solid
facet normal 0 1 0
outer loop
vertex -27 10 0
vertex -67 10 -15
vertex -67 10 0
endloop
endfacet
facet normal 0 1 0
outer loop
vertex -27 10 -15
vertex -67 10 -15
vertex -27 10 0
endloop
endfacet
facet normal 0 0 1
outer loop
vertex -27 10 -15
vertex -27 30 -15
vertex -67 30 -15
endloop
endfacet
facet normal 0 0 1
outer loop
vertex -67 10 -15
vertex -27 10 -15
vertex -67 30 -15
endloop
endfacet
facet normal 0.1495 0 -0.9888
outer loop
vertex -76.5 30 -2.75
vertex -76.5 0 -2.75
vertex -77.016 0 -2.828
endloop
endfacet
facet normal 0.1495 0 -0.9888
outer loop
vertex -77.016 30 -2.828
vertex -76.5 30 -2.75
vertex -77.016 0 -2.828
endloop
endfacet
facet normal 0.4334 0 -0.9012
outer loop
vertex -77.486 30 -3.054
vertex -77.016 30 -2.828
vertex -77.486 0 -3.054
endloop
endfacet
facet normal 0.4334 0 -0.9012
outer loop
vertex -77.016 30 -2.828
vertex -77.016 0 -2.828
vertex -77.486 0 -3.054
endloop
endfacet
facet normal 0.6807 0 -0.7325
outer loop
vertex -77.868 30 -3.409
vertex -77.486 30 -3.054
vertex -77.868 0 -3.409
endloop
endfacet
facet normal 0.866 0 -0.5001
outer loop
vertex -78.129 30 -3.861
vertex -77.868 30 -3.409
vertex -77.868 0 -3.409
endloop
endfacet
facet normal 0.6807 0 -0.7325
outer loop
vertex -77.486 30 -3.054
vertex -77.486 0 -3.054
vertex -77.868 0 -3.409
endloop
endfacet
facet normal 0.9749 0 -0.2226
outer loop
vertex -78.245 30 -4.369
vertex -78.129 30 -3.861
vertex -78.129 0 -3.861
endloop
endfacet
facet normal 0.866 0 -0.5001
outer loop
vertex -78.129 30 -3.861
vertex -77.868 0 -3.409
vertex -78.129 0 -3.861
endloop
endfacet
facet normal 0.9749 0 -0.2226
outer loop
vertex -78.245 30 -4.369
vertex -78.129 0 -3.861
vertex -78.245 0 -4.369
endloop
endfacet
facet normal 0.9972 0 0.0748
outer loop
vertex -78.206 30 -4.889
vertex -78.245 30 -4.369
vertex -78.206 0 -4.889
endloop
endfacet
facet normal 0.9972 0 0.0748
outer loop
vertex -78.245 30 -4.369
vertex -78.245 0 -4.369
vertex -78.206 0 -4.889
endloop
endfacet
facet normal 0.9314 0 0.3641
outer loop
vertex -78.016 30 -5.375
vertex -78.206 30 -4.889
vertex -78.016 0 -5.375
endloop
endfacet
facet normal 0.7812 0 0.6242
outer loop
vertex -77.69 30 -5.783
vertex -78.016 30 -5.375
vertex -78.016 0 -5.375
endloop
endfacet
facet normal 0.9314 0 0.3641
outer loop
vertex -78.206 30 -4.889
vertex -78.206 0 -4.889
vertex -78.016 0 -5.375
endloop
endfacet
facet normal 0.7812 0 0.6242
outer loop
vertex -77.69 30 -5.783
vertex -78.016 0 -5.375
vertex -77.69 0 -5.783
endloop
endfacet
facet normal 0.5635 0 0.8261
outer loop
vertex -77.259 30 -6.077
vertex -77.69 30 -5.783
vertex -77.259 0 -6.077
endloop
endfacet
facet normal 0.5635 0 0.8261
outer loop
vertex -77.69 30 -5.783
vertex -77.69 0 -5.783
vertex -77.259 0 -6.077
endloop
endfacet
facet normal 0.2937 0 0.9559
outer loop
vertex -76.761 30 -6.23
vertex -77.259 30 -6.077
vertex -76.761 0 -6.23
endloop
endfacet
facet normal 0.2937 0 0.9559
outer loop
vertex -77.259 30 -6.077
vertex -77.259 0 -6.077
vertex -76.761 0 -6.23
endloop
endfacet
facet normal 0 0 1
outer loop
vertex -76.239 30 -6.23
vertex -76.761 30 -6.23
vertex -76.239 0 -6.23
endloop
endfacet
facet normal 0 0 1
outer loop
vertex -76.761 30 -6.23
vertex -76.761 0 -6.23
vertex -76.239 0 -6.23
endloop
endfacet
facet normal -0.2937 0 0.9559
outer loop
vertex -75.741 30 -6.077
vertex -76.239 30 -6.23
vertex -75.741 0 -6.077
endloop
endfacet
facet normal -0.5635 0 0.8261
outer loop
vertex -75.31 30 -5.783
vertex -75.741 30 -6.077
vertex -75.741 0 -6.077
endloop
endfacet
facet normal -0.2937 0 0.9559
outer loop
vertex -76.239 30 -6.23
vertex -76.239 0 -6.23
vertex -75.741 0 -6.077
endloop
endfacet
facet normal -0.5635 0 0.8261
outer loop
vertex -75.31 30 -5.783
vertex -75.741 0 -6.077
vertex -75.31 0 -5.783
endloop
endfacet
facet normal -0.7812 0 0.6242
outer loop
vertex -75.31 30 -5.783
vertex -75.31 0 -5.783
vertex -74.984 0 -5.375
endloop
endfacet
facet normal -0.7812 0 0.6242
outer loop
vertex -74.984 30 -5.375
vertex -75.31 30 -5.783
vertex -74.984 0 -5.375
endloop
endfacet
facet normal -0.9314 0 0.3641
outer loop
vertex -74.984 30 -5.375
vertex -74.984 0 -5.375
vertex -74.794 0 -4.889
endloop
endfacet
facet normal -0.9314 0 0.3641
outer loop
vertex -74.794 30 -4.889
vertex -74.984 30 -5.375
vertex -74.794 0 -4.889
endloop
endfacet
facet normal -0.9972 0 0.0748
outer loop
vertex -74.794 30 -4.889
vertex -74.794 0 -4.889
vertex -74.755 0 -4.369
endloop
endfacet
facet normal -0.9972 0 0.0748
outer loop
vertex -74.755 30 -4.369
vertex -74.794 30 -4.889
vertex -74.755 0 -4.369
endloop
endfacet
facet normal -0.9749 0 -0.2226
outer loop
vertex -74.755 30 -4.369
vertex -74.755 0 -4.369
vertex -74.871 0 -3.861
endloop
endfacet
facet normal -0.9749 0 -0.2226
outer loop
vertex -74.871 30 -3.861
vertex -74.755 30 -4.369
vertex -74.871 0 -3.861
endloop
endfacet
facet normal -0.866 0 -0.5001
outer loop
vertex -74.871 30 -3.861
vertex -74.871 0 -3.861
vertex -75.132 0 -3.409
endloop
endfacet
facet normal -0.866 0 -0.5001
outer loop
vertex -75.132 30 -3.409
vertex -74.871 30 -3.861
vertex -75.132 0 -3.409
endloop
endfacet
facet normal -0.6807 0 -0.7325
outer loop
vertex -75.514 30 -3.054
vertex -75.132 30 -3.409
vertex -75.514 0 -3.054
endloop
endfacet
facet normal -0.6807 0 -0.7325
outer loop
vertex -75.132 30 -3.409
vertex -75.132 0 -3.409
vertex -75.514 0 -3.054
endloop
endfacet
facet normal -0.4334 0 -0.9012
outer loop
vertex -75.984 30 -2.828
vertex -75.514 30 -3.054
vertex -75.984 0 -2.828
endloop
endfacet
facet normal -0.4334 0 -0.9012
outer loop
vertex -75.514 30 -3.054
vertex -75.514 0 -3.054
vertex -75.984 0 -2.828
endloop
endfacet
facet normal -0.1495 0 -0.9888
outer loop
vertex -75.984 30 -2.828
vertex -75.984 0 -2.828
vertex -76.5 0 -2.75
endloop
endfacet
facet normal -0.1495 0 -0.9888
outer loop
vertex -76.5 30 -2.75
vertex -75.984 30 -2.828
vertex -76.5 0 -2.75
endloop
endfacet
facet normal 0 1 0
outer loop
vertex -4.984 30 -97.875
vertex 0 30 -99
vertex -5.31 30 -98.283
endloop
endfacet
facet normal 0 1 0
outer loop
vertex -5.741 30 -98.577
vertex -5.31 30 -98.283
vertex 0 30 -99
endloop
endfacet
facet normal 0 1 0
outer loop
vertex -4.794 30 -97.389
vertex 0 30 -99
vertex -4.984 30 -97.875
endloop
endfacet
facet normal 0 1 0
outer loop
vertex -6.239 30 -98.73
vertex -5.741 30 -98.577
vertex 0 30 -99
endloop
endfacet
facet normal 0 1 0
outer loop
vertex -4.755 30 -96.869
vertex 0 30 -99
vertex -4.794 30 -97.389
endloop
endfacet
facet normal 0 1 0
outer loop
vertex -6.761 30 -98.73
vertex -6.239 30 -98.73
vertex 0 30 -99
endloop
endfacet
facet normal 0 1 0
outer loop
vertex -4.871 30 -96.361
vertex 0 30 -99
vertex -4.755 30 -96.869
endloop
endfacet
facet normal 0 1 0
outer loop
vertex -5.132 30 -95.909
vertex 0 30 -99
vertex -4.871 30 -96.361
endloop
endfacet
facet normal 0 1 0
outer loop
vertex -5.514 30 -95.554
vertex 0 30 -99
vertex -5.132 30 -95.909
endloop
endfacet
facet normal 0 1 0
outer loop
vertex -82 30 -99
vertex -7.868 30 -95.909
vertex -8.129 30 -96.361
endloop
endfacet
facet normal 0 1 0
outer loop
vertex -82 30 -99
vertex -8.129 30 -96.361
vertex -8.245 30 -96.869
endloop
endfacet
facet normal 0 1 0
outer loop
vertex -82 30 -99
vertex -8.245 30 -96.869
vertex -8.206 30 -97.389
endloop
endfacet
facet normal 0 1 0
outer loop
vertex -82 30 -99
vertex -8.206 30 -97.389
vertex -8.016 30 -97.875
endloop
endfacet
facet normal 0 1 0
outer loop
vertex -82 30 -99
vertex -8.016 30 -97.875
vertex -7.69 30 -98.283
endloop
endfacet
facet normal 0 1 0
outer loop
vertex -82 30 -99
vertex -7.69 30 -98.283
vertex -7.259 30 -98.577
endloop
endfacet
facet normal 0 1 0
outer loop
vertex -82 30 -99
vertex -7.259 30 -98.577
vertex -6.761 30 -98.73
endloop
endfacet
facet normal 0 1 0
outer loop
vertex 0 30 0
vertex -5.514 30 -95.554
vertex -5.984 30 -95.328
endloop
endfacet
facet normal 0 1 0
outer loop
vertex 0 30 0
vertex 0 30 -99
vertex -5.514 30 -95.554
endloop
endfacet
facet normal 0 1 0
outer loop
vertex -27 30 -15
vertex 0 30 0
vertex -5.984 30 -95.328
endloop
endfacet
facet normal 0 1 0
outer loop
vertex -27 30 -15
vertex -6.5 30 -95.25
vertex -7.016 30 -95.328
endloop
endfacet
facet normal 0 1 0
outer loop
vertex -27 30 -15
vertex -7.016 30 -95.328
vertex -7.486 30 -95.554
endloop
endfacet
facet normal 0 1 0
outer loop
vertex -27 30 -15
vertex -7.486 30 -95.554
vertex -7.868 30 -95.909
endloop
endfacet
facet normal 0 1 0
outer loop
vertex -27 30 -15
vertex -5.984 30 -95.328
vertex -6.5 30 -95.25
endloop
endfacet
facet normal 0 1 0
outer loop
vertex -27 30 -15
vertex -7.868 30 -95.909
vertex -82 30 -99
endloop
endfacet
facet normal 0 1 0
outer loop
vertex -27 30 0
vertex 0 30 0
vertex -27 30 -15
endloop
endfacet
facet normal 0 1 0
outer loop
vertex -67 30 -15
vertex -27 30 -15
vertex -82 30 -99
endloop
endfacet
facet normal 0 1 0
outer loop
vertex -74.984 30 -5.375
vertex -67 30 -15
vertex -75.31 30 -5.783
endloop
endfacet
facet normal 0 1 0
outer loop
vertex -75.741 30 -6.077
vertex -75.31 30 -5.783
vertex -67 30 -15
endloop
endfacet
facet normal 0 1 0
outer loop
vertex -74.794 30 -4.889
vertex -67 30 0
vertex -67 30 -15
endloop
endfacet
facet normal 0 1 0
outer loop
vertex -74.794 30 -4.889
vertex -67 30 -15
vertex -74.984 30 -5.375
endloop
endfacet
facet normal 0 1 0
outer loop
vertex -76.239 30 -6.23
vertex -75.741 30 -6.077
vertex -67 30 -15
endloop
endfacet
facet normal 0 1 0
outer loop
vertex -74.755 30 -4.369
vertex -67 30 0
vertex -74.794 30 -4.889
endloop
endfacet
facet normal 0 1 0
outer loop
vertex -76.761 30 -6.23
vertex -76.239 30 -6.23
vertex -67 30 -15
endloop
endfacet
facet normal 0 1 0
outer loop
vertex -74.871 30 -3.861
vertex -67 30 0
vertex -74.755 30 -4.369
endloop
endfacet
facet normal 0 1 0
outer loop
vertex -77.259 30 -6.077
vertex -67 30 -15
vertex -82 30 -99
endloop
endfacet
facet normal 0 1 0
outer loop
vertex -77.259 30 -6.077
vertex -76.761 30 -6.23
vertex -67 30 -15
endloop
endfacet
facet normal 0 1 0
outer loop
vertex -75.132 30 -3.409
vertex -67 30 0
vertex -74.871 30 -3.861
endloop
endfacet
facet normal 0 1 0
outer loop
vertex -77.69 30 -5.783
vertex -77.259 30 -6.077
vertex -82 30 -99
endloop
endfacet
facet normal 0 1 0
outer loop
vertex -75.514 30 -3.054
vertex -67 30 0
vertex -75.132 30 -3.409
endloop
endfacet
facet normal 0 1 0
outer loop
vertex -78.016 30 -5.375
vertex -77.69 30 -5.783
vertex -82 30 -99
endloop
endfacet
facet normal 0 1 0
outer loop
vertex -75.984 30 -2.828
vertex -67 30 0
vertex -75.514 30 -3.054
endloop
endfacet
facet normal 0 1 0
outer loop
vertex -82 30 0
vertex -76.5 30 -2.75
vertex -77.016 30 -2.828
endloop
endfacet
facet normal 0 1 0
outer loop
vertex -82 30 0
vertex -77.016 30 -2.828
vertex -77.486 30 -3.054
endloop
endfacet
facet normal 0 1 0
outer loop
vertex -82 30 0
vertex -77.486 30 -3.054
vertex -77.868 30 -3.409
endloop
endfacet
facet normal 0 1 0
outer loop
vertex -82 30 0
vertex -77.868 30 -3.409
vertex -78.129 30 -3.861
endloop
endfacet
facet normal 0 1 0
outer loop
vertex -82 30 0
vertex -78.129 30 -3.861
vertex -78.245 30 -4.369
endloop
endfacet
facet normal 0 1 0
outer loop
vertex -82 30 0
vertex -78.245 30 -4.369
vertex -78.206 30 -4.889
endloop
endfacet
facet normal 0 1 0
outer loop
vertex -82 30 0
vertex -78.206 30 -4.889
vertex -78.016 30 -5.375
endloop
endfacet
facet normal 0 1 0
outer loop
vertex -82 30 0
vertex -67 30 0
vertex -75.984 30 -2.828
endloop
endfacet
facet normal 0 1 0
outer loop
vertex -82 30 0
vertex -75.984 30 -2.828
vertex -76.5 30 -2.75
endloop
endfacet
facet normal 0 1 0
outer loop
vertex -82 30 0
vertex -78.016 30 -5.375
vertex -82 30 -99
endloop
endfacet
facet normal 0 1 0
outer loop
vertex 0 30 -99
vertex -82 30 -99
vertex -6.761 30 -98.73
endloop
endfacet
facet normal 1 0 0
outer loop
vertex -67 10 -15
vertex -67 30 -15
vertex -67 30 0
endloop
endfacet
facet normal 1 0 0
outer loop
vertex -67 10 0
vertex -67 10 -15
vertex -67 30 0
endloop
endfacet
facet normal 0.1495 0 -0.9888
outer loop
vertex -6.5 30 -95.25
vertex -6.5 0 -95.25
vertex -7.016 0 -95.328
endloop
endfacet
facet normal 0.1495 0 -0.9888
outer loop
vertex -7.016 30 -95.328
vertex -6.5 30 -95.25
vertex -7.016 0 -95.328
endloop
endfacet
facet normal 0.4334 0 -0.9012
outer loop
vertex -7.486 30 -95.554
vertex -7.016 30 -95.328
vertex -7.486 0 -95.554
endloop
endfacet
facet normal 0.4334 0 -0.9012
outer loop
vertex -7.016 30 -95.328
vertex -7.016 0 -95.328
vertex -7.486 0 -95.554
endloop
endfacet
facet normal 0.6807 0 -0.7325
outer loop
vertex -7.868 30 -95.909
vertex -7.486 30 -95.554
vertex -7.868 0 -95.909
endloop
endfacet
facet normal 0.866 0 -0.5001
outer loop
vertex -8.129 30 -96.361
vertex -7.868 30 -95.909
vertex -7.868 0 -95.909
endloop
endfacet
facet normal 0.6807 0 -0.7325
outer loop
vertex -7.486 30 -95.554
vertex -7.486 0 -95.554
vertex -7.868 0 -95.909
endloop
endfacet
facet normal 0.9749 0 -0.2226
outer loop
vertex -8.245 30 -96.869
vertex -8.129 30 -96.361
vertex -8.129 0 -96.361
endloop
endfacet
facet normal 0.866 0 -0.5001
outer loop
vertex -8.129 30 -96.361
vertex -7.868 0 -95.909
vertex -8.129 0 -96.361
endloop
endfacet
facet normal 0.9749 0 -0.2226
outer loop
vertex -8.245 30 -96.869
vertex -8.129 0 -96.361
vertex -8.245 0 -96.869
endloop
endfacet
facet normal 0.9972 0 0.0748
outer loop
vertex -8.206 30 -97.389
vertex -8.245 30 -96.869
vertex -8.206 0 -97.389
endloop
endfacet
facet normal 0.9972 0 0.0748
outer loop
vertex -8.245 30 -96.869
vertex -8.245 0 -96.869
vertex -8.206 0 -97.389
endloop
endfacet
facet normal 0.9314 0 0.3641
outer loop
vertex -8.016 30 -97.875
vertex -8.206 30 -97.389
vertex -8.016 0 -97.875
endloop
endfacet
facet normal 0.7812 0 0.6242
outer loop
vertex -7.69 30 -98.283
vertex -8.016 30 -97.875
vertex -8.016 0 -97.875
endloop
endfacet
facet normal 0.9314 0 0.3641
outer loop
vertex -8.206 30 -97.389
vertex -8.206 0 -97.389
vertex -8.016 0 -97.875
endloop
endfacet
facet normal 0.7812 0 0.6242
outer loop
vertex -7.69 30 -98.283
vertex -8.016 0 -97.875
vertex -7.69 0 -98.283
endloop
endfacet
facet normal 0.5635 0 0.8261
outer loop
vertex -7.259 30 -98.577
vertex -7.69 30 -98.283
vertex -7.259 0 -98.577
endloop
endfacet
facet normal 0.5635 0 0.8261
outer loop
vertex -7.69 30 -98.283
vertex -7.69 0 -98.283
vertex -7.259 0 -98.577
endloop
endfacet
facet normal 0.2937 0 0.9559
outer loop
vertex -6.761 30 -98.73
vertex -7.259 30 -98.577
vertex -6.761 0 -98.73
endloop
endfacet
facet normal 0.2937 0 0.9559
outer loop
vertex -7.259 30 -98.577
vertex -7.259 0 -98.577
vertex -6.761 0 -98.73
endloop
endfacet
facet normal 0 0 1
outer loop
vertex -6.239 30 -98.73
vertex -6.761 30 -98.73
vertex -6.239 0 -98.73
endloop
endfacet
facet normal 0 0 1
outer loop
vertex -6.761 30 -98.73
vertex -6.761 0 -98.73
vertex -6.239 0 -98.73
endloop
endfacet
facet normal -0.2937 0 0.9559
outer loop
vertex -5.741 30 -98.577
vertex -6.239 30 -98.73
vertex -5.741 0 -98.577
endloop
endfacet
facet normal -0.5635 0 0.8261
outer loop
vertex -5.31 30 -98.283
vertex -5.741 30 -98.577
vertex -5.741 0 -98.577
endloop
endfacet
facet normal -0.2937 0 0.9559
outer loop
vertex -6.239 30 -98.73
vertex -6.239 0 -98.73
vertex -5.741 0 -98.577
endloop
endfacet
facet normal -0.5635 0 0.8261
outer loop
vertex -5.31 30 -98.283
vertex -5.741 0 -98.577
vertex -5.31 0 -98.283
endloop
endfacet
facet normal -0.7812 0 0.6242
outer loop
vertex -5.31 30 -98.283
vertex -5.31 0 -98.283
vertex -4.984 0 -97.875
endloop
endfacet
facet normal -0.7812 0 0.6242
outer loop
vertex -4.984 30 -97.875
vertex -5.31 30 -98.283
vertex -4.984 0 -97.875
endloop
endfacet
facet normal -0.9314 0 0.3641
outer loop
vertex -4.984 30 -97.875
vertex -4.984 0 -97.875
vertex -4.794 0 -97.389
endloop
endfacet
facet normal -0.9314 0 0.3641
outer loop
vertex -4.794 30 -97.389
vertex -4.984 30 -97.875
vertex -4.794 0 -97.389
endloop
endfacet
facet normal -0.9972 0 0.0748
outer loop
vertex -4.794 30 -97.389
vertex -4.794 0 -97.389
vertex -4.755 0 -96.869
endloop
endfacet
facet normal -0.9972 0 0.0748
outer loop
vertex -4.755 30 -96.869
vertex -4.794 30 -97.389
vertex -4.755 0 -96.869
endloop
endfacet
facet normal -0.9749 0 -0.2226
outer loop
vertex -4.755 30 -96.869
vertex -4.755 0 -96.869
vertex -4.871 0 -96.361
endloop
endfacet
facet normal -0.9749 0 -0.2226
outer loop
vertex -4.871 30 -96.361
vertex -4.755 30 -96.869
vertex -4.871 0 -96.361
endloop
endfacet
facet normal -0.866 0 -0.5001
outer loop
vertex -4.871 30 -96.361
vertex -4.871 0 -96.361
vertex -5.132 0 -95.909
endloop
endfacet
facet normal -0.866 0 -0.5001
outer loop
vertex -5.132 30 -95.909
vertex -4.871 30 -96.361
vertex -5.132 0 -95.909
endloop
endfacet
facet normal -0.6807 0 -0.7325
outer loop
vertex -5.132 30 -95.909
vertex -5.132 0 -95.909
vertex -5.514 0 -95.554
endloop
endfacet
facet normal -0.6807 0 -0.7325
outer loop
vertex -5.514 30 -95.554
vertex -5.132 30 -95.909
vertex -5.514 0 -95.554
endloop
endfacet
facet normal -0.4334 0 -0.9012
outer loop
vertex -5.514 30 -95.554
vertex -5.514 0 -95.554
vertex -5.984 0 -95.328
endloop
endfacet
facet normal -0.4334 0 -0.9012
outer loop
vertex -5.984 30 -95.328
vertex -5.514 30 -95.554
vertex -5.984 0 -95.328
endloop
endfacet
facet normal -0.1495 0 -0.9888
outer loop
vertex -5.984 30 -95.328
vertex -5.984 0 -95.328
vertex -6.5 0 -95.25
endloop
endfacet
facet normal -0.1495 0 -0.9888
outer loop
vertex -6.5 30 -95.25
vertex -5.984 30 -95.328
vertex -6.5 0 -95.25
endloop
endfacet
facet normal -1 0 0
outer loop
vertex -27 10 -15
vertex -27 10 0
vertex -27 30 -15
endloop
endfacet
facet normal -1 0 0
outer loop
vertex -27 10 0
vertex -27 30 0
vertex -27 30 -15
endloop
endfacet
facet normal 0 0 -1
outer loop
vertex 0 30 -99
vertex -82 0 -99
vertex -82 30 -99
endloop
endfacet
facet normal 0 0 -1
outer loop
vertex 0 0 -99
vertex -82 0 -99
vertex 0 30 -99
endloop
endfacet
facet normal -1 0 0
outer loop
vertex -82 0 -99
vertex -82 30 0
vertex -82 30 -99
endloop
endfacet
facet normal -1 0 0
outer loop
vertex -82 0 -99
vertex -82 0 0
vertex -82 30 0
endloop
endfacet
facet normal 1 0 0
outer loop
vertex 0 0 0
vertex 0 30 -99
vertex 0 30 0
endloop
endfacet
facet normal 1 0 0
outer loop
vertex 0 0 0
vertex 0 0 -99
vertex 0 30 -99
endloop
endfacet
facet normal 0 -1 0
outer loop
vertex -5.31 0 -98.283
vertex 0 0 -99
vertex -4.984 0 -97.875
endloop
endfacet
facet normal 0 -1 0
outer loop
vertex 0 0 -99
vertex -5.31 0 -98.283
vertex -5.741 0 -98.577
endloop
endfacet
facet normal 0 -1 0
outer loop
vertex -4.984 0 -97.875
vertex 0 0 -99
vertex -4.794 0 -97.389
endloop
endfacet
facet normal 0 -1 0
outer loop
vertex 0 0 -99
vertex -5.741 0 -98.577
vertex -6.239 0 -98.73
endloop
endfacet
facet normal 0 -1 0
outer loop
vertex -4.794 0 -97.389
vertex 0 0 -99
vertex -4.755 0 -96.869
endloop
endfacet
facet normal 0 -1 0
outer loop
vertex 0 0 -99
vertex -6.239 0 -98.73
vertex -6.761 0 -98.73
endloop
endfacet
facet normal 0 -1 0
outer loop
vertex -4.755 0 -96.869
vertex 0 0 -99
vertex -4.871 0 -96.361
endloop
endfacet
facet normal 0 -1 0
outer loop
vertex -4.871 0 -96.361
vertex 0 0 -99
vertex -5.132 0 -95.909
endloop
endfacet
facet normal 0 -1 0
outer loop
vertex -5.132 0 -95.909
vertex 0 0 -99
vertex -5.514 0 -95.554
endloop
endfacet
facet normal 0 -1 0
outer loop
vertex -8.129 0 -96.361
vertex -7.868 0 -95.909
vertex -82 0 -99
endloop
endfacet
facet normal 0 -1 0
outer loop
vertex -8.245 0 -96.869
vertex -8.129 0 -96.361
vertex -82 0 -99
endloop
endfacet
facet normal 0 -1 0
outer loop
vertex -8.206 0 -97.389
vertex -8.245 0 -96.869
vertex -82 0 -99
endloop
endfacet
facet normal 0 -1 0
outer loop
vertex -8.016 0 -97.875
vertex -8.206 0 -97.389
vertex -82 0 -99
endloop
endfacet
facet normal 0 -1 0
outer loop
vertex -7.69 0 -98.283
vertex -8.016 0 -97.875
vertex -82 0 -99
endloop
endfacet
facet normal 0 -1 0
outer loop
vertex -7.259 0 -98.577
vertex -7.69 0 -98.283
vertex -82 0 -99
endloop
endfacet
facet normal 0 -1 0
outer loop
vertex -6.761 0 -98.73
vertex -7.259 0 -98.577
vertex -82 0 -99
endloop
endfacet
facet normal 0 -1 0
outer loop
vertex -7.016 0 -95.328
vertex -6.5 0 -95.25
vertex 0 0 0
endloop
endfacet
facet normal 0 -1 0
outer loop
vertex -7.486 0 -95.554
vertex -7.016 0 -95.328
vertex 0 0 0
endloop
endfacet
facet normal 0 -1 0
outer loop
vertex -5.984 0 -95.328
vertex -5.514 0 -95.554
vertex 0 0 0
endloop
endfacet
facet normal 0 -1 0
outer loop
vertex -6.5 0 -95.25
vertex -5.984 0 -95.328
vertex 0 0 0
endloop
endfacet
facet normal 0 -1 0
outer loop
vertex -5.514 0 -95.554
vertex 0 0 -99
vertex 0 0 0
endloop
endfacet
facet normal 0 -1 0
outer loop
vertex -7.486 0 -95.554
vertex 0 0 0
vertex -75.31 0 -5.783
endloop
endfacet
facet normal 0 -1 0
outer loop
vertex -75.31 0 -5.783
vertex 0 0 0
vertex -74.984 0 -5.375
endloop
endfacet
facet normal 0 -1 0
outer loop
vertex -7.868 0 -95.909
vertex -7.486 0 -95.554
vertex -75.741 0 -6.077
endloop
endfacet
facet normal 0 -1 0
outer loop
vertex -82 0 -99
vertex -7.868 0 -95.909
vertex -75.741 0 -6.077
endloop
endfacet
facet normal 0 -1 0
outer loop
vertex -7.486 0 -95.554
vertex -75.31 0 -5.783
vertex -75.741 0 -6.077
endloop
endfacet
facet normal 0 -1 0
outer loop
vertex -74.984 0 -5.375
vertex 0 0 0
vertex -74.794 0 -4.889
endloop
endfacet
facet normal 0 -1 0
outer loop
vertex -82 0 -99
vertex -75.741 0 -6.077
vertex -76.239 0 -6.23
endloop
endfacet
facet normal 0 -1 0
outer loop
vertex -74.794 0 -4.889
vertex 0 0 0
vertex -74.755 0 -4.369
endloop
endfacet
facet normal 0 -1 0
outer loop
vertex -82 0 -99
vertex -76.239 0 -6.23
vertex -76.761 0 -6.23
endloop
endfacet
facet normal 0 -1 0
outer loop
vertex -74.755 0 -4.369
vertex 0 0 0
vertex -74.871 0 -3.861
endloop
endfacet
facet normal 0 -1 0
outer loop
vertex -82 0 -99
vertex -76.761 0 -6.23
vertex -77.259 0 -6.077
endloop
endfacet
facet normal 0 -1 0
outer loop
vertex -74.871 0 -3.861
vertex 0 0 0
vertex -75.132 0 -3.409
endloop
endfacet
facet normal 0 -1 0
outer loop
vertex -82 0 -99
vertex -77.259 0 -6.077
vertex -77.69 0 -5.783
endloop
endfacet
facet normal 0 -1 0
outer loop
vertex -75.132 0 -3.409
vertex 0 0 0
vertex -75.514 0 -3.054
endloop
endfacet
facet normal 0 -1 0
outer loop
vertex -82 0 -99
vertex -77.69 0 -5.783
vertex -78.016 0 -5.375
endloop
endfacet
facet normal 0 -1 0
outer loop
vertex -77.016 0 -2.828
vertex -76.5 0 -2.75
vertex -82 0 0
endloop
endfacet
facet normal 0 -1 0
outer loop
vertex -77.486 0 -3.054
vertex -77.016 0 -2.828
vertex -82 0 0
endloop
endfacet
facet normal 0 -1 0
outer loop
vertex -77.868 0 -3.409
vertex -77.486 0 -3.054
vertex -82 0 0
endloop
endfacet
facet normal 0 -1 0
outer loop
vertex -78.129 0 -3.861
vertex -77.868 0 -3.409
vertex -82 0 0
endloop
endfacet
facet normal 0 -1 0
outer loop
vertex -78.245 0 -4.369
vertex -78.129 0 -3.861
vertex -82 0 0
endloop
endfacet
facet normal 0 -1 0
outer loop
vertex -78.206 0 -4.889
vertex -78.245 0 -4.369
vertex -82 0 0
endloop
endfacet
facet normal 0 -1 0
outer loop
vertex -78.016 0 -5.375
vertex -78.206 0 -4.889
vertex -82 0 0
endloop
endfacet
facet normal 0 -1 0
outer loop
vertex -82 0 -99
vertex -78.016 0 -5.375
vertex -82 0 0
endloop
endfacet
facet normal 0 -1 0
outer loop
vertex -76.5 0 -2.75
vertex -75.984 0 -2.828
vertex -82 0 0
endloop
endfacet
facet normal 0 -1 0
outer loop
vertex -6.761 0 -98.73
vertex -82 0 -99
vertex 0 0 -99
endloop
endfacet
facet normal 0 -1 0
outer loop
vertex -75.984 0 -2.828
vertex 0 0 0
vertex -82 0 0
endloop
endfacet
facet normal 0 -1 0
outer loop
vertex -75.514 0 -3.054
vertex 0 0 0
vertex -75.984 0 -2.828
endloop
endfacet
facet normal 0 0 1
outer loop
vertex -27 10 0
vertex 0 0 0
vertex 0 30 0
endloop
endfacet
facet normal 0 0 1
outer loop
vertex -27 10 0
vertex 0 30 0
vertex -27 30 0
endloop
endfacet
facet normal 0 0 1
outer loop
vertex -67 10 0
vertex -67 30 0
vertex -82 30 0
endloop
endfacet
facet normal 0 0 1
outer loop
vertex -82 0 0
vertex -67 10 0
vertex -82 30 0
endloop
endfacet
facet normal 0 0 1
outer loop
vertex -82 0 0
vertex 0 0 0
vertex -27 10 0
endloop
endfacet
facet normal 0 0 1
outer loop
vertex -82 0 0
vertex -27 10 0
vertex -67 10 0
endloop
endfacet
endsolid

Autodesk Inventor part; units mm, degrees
ref_plane "YZ Plane" through (0, 0, 0) normal (1, 0, 0) x (0, 1, 0)
ref_plane "XZ Plane" through (0, 0, 0) normal (0, 1, 0) x (-1, 0, 0)
ref_plane "XY Plane" through (0, 0, 0) normal (0, 0, 1) x (1, 0, 0)
sketch "Skizze1" plane through (0, 0, 0) normal (0, 1, 0) x (-1, 0, 0)
  line L0 (0, 0) -> (82, 0)
  line L1 (82, 0) -> (82, -99)
  line L2 (82, -99) -> (0, -99)
  line L3 (0, -99) -> (0, 0)
  dimension "d0" = 82
  dimension "d1" = 99
extrude "Extrusion1" add sketch "Skizze1" along normal blind 30
sketch "Skizze2" plane through (0, 30, 0) normal (0, 1, 0) x (1, 0, 0)
  point P0 (0, 0)
sketch "Skizze3" plane through (0, 30, 0) normal (0, 1, 0) x (1, 0, 0)
  line L0 (-82, 0) -> (0, 0) projected
  line L1 (0, 0) -> (0, 99) projected
  point P0 (-76.5, 4.5)
  point P1 (-6.5, 97)
  dimension "d4" = 4.5
  dimension "d5" = 92.5
  dimension "d7" = 6.5
  dimension "d8" = 70
hole "Bohrung1" at (-76.5, 30, -4.5) at (-6.5, 30, -97) direction (0, -1, 0) diameter 3.5 end through all
sketch "Skizze4" plane through (0, 30, 0) normal (0, 1, 0) x (1, 0, 0)
  line L0 (-82, 0) -> (0, 0) projected
  line L1 (-67, 0) -> (-27, 0)
  line L2 (-27, 0) -> (-27, 15)
  line L3 (-27, 15) -> (-67, 15)
  line L4 (-67, 15) -> (-67, 0)
  line L5 (-82, 99) -> (-82, 0) projected
  dimension "d16" = 15
  dimension "d17" = 15
  dimension "d18" = 40
extrude "Extrusion2" cut sketch "Skizze4" against normal blind 20
properties part number "PSU" material "Stahl, weich"
